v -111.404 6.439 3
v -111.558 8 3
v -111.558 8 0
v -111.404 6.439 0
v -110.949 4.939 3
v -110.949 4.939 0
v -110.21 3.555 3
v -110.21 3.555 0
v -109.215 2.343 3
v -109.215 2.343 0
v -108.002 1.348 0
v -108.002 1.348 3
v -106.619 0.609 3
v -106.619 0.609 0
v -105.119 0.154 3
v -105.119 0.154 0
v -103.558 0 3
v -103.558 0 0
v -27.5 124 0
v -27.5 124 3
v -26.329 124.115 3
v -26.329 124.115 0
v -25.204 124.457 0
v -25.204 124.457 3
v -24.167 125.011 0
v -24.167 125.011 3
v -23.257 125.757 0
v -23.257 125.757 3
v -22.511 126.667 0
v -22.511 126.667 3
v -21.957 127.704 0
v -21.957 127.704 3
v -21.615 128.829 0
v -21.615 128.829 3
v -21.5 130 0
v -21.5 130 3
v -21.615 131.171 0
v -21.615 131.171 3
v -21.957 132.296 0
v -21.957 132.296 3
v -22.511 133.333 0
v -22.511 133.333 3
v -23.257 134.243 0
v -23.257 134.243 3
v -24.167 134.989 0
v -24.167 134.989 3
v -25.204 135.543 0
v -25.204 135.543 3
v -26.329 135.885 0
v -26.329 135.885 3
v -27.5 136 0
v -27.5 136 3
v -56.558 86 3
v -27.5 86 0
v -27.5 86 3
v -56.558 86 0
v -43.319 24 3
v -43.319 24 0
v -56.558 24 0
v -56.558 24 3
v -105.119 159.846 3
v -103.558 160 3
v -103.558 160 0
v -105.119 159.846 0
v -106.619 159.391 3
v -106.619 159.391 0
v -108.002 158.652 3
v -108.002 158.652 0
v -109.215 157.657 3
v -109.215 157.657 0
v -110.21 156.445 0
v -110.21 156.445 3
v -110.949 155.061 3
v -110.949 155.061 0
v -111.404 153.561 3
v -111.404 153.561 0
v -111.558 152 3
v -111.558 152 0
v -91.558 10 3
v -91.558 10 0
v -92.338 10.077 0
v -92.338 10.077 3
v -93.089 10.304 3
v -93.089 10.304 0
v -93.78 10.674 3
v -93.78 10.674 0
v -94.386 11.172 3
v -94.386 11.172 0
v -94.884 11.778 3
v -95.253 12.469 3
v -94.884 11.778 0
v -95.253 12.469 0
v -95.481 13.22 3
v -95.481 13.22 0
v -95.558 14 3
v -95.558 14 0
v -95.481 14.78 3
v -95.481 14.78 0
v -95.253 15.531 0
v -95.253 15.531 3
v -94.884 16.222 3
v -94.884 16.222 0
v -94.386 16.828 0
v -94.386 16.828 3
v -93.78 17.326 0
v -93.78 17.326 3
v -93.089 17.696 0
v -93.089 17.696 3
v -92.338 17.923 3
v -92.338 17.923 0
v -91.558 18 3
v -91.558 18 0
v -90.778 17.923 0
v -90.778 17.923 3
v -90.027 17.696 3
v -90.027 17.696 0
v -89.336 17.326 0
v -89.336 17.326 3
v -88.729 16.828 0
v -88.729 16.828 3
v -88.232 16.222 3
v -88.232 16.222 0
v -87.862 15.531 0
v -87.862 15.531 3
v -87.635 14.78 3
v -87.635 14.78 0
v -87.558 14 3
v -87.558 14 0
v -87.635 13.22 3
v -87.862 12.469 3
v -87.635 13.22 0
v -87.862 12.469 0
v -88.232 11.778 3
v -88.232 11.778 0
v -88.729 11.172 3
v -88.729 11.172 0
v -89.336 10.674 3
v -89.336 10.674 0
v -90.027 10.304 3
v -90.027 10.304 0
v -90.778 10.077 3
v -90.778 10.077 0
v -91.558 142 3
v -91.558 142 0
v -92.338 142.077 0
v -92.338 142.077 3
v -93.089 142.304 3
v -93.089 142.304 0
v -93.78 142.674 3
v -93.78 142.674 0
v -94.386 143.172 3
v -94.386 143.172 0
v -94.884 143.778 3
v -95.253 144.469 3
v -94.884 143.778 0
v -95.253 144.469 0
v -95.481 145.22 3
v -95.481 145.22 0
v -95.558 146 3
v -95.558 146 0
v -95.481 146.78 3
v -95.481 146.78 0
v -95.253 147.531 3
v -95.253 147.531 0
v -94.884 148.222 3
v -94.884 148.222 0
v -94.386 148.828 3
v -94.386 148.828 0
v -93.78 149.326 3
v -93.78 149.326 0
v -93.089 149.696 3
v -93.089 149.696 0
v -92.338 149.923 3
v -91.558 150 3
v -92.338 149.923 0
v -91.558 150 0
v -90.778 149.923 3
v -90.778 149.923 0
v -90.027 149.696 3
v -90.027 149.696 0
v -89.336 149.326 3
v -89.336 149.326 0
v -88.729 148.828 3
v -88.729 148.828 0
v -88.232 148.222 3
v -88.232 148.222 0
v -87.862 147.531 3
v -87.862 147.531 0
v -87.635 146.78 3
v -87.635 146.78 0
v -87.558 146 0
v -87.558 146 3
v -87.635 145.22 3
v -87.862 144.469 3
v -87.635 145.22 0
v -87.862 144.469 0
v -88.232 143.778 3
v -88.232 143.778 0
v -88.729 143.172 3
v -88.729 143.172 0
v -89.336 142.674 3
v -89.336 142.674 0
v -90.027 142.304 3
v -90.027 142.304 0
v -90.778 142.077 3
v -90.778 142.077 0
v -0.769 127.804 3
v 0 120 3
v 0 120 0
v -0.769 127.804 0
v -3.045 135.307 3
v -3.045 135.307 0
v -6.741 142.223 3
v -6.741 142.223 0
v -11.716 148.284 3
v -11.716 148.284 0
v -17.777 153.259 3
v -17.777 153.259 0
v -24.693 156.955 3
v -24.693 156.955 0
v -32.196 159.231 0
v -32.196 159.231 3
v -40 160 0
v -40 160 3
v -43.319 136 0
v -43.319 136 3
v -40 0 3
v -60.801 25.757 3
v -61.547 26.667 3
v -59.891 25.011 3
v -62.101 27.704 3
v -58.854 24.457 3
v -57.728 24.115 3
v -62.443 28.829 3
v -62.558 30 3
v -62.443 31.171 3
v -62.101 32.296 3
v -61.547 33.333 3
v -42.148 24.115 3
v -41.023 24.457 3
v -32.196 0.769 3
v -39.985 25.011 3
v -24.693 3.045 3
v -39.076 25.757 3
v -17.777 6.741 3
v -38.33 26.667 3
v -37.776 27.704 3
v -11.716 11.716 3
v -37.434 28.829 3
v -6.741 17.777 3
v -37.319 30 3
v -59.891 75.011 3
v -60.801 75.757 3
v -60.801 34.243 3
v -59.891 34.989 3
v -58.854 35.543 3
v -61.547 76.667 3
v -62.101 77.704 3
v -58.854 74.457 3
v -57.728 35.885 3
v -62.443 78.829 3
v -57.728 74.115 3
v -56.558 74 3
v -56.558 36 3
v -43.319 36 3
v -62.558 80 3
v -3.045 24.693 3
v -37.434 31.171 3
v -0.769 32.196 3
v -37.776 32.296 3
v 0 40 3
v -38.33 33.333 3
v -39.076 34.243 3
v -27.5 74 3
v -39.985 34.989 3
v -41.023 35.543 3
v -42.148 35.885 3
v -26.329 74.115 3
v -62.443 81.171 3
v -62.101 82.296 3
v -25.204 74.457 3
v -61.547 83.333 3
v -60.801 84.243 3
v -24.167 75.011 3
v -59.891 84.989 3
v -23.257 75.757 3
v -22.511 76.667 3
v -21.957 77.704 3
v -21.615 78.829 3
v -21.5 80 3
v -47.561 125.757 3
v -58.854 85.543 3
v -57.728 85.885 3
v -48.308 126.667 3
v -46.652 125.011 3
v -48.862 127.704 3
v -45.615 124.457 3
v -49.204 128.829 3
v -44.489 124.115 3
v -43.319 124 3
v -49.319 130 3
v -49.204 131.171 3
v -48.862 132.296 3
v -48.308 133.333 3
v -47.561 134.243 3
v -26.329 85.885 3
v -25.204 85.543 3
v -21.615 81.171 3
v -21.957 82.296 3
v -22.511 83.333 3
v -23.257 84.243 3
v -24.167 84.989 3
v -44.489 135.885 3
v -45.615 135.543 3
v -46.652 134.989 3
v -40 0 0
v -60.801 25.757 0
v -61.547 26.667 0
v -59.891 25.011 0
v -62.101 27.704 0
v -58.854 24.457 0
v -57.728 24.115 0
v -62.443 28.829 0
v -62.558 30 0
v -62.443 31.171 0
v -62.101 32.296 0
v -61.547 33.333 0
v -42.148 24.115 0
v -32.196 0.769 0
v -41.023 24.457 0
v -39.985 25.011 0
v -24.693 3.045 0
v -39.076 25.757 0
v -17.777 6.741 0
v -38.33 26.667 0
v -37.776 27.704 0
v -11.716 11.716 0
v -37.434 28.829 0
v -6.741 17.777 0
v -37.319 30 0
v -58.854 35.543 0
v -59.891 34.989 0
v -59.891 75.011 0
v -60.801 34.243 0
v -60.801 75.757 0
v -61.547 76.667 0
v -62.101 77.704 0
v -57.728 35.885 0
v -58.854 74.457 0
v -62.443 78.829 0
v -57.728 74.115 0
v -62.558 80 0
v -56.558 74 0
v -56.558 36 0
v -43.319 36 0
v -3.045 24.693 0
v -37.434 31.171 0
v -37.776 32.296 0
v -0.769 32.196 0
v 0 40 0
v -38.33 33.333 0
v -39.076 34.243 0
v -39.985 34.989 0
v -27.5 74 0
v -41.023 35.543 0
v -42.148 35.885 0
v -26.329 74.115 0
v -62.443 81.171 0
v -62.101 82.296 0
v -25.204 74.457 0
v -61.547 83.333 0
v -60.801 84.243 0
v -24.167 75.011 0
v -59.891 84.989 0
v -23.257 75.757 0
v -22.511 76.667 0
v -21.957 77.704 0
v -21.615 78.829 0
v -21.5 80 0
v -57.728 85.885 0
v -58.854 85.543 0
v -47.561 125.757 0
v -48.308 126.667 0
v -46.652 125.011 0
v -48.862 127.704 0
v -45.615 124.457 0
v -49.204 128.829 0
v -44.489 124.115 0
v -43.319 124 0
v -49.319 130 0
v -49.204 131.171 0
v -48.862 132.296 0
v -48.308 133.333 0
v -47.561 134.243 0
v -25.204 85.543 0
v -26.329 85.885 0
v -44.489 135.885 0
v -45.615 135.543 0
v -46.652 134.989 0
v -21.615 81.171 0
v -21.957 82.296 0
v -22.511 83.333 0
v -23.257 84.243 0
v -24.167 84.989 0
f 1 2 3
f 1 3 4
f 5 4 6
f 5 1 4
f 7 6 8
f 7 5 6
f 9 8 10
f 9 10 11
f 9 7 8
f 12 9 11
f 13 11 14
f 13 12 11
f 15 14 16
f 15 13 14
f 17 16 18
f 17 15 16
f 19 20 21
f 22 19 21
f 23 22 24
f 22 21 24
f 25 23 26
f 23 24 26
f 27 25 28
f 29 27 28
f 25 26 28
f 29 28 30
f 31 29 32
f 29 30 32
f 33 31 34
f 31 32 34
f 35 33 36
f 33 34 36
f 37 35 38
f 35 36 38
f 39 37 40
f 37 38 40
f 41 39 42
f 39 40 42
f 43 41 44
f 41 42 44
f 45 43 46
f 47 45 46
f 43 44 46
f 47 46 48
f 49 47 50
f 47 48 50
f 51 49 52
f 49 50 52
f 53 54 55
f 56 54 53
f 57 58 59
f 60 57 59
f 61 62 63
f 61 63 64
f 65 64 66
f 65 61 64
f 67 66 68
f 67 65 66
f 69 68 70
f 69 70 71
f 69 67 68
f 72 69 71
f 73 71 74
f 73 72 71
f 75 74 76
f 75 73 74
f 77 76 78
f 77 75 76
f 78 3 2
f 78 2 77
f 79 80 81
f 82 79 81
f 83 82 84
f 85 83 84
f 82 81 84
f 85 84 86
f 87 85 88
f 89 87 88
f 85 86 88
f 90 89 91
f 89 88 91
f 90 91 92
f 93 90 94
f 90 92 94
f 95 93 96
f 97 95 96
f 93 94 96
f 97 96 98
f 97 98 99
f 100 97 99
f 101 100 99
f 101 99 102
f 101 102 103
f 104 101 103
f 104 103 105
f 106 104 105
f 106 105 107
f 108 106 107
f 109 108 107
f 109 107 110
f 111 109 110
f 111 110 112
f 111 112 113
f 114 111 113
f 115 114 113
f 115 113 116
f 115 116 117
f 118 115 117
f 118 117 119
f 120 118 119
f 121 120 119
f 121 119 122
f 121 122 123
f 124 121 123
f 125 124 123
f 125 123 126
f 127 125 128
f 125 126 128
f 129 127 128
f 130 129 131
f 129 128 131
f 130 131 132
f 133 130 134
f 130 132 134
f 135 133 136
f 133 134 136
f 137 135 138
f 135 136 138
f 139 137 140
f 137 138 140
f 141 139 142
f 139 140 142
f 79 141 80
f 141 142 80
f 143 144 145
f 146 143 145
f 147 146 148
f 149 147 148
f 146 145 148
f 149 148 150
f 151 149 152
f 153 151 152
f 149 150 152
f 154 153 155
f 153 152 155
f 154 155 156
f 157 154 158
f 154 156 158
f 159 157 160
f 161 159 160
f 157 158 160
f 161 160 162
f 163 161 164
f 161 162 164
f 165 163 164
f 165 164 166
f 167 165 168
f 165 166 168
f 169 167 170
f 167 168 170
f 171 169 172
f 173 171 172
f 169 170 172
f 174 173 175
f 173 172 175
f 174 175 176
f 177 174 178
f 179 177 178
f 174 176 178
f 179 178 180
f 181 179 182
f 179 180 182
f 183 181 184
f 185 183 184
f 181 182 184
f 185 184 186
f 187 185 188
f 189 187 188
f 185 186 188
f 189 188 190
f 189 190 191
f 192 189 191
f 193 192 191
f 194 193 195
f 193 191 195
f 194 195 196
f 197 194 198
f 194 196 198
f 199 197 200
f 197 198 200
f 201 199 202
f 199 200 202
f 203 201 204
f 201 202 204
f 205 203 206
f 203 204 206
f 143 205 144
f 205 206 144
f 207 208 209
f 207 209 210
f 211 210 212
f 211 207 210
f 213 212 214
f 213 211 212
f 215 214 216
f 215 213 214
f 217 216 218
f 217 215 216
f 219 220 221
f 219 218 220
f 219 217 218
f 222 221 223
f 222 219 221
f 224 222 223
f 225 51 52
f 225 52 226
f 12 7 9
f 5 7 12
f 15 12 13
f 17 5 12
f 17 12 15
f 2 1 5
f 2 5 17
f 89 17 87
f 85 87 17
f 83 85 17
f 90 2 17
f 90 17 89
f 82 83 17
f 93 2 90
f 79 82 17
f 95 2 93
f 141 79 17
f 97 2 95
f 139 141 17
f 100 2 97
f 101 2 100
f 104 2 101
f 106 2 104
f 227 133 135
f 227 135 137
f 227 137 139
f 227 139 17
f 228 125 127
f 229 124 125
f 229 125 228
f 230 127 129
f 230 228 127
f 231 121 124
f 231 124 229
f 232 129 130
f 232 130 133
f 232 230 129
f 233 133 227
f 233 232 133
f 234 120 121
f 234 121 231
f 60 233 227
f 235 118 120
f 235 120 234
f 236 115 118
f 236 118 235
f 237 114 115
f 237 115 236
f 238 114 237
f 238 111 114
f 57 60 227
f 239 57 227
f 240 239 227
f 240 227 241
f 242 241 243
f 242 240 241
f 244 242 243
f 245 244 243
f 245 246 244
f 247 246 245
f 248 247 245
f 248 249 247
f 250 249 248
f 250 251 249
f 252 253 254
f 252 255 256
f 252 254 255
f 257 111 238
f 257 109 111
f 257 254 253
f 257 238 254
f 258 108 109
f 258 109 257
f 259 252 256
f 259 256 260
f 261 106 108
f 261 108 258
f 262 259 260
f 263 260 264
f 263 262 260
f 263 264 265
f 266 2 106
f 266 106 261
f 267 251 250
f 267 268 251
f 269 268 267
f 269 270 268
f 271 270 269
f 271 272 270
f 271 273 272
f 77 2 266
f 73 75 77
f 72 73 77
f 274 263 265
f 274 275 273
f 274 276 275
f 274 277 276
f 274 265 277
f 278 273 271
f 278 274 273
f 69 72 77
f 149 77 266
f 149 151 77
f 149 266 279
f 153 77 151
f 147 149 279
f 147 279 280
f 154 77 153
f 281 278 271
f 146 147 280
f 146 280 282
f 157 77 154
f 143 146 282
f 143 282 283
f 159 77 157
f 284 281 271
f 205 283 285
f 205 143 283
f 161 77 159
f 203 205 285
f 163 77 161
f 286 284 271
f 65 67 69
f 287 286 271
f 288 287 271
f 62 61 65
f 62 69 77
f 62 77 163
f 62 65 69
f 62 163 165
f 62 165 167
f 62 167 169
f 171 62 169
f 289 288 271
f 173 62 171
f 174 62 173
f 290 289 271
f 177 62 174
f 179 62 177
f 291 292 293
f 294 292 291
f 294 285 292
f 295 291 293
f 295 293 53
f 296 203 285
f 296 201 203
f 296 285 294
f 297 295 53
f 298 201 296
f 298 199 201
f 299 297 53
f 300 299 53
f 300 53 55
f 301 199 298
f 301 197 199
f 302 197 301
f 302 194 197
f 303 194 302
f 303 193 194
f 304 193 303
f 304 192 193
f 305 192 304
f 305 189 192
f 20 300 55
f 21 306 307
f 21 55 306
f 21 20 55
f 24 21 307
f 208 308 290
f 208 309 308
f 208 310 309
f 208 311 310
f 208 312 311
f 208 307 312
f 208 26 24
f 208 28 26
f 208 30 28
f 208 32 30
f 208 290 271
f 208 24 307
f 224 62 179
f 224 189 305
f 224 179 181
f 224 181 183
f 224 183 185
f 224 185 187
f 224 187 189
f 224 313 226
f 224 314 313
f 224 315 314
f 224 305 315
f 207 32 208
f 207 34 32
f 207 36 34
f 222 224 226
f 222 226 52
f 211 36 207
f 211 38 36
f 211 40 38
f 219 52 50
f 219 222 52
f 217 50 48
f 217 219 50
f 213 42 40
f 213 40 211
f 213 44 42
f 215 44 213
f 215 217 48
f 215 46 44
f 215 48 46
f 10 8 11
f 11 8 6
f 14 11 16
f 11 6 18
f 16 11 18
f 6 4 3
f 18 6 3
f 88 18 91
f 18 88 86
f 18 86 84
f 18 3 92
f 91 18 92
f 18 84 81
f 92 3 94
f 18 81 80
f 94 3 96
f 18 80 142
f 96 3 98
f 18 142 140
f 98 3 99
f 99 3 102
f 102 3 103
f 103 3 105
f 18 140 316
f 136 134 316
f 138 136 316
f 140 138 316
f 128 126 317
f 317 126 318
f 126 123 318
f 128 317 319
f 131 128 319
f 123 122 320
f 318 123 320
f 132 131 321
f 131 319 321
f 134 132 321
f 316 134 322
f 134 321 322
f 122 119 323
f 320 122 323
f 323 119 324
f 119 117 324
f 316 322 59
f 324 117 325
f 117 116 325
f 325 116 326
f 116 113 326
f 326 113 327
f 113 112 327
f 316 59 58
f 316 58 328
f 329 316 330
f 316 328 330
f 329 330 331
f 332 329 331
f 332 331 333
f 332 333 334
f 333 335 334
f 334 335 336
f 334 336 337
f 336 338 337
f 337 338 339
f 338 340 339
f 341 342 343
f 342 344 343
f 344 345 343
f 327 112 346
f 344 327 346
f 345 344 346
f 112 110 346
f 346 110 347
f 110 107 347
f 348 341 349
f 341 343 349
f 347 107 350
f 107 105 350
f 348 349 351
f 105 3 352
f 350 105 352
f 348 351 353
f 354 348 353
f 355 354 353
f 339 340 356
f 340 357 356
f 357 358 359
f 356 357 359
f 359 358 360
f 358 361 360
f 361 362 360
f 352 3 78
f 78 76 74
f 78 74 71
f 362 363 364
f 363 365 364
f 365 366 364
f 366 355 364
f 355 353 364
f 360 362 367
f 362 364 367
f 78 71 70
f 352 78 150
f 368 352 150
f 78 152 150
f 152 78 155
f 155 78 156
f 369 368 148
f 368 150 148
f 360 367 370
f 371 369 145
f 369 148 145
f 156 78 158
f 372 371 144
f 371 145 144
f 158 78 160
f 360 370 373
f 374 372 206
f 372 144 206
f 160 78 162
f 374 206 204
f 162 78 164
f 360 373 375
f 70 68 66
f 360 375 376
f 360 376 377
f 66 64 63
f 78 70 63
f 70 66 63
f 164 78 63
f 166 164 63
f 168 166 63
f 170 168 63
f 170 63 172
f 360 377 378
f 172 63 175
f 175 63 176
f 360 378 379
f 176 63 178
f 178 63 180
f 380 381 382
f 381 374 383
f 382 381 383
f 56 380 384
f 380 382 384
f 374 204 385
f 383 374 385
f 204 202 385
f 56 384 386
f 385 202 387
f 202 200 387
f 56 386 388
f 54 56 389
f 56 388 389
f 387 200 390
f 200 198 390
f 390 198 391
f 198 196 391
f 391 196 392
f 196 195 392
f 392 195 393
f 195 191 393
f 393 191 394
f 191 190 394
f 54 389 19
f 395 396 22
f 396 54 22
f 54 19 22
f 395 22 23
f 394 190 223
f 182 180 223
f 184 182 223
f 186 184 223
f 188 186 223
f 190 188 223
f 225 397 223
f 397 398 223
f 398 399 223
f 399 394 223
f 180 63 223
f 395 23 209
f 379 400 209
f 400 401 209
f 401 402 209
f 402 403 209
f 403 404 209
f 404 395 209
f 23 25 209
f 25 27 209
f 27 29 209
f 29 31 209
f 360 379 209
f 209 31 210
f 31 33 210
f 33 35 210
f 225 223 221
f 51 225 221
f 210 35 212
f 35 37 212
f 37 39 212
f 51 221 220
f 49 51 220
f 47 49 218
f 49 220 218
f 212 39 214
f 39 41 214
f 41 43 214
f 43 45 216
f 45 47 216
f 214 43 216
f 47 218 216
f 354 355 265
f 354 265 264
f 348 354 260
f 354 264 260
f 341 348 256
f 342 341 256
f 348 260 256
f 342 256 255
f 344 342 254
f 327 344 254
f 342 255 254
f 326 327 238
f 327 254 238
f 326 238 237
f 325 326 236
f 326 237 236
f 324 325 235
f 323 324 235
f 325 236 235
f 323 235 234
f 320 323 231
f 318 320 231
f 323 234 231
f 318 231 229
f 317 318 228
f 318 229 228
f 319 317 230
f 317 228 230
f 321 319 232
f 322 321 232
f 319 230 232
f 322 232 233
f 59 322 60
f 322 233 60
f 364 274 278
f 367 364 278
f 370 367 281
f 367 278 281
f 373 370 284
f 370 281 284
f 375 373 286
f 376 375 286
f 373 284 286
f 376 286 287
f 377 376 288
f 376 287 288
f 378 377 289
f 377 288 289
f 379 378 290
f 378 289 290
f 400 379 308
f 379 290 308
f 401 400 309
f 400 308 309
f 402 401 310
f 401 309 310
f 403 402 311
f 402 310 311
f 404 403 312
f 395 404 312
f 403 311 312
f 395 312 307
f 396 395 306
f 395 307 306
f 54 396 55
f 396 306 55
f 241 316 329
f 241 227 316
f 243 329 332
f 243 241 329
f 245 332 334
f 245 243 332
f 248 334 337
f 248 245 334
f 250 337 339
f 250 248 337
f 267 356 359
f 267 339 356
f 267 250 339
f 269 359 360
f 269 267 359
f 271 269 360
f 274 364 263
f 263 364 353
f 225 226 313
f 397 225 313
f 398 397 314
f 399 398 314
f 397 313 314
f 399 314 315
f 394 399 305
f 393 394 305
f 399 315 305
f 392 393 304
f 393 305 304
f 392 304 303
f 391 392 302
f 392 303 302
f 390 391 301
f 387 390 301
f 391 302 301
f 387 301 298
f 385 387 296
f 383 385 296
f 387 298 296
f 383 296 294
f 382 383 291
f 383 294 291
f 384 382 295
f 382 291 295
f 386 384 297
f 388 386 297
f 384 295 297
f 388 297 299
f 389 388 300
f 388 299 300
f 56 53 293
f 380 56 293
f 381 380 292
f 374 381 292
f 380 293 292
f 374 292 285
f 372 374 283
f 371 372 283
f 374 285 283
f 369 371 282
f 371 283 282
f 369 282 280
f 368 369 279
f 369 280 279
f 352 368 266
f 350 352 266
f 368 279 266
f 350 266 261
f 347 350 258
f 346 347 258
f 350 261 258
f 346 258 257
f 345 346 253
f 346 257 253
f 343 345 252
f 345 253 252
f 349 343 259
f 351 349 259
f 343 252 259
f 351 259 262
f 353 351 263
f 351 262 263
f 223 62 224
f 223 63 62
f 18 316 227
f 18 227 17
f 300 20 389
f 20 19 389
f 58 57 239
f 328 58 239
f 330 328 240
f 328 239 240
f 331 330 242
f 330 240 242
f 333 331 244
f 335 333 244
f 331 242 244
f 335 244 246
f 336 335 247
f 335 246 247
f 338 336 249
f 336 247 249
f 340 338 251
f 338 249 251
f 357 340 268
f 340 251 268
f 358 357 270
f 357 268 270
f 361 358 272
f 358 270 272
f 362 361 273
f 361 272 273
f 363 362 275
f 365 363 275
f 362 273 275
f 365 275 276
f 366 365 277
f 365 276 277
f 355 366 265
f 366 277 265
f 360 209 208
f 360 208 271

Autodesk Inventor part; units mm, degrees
ref_plane "YZ Plane" through (0, 0, 0) normal (1, 0, 0) x (0, 1, 0)
ref_plane "XZ Plane" through (0, 0, 0) normal (0, 1, 0) x (-1, 0, 0)
ref_plane "XY Plane" through (0, 0, 0) normal (0, 0, 1) x (1, 0, 0)
sketch "Sketch1" plane through (0, 0, 0) normal (0, 0, 1) x (1, 0, 0)
  circle A0 centre (1008.2886, -225.2) radius 1095
  line L0 (-27.5, 131.7988) -> (-27.5, 31.7988)
  line L1 (-43.3188, 130) -> (-43.3188, 30)
  line L2 (-56.5579, 30) -> (-56.5579, 130)
  line L3 (-27.5, 130) -> (-56.5579, 130)
  line L4 (-27.5, 80) -> (-56.5579, 80)
  line L5 (-27.5, 30) -> (-56.5579, 30)
  line L6 (-111.5579, 160) -> (0, 160)
  line L7 (0, 160) -> (0, 0)
  line L8 (0, 0) -> (-111.5579, 0)
  line L9 (-111.5579, 0) -> (-111.5579, 160)
  point P0 (0, 0)
  point P1 (-43.3188, 80)
  dimension "d4" = 2190
  dimension "d10" = 50
  dimension "d11" = 50
  dimension "d21" = 305.2
  dimension "d36" = 30
  dimension "d37" = 30
  dimension "d38" = 27.5
  dimension "d39" = 55
extrude "Extrusion1" add sketch "Sketch1" along normal blind 3 contours L6 L7 L8 A0 L5 L1 L4 L0 | A0 L3 L2 L8 L9 L6 | L0 L4 A0 | A0 L1 L3 | L2 L4 A0 | A0 L1 L5 | L4 L2 L3 L1
hole "Hole1" at (-27.5, 130, 0) at (-43.3188, 80, 0) at (-56.5579, 30, 0) at (-43.3188, 130, 0) at (-27.5, 80, 0) at (-43.3188, 30, 0) at (-56.5579, 80, 0) direction (0, 0, 1) diameter 12 end through all
sketch "Sketch2" plane through (0, 0, 0) normal (0, 0, -1) x (-1, 0, 0)
  circle A0 centre (27.5, 130) radius 6 projected
  circle A1 centre (43.3188, 130) radius 6 projected
  line L0 (27.5, 124) -> (43.3188, 124)
  circle A2 centre (27.5, 130) radius 6 projected
  line L1 (27.5, 136) -> (43.3188, 136)
  line L2 (27.5, 136) -> (27.5, 124)
  line L3 (43.3188, 124) -> (43.3188, 136)
  line L4 (27.5, 86) -> (56.5579, 86)
  line L5 (27.5, 74) -> (56.5579, 74)
  circle A3 centre (27.5, 80) radius 6 projected
  circle A4 centre (56.5579, 80) radius 6 projected
  line L6 (27.5, 86) -> (27.5, 74)
  line L7 (56.5579, 74) -> (56.5579, 86)
  line L8 (43.3188, 36) -> (56.5579, 36)
  line L9 (43.3188, 24) -> (56.5579, 24)
  circle A5 centre (43.3188, 30) radius 6 projected
  circle A6 centre (56.5579, 30) radius 6 projected
  line L10 (43.3188, 24) -> (43.3188, 36)
  line L11 (56.5579, 24) -> (56.5579, 36)
  point P0 (0, 0)
extrude "Extrusion2" cut sketch "Sketch2" against normal blind 3 contours A0 L1 A1 L0 | L4 A4 L5 A3 | L8 A6 L9 A5
sketch "Sketch3" plane through (0, 0, 3) normal (0, 0, 1) x (1, 0, 0)
  line L0 (-111.5579, 160) -> (-111.5579, 0) projected
  line L1 (0, 160) -> (-111.5579, 160) projected
  line L2 (-111.5579, 0) -> (0, 0) projected
  line L3 (-56.5579, 86) -> (-27.5, 86) projected
  line L4 (-27.5, 124) -> (-43.3188, 124) projected
  line L5 (-27.5, 74) -> (-56.5579, 74) projected
  line L6 (-56.5579, 36) -> (-43.3188, 36) projected
  point P0 (-91.5579, 146)
  point P1 (-91.5579, 14)
  dimension "d51" = 20
  dimension "d52" = 14
  dimension "d53" = 14
  dimension "d54" = 20
hole "Hole2" at (-91.5579, 14, 3) at (-91.5579, 146, 3) direction (0, 0, -1) diameter 8 end through all
fillet "Fillet2" radius 40 2 edges at (0, 0, 1.5) (0, 160, 1.5)
fillet "Fillet3" radius 8 2 edges at (-111.5579, 0, 1.5) (-111.5579, 160, 1.5)
equation "\"d11\" = d10"
equation "\"d37\" = d36"
equation "\"d39\" = 2 * d38"
properties part number "adjust_sheet" material "Steel, Mild"
